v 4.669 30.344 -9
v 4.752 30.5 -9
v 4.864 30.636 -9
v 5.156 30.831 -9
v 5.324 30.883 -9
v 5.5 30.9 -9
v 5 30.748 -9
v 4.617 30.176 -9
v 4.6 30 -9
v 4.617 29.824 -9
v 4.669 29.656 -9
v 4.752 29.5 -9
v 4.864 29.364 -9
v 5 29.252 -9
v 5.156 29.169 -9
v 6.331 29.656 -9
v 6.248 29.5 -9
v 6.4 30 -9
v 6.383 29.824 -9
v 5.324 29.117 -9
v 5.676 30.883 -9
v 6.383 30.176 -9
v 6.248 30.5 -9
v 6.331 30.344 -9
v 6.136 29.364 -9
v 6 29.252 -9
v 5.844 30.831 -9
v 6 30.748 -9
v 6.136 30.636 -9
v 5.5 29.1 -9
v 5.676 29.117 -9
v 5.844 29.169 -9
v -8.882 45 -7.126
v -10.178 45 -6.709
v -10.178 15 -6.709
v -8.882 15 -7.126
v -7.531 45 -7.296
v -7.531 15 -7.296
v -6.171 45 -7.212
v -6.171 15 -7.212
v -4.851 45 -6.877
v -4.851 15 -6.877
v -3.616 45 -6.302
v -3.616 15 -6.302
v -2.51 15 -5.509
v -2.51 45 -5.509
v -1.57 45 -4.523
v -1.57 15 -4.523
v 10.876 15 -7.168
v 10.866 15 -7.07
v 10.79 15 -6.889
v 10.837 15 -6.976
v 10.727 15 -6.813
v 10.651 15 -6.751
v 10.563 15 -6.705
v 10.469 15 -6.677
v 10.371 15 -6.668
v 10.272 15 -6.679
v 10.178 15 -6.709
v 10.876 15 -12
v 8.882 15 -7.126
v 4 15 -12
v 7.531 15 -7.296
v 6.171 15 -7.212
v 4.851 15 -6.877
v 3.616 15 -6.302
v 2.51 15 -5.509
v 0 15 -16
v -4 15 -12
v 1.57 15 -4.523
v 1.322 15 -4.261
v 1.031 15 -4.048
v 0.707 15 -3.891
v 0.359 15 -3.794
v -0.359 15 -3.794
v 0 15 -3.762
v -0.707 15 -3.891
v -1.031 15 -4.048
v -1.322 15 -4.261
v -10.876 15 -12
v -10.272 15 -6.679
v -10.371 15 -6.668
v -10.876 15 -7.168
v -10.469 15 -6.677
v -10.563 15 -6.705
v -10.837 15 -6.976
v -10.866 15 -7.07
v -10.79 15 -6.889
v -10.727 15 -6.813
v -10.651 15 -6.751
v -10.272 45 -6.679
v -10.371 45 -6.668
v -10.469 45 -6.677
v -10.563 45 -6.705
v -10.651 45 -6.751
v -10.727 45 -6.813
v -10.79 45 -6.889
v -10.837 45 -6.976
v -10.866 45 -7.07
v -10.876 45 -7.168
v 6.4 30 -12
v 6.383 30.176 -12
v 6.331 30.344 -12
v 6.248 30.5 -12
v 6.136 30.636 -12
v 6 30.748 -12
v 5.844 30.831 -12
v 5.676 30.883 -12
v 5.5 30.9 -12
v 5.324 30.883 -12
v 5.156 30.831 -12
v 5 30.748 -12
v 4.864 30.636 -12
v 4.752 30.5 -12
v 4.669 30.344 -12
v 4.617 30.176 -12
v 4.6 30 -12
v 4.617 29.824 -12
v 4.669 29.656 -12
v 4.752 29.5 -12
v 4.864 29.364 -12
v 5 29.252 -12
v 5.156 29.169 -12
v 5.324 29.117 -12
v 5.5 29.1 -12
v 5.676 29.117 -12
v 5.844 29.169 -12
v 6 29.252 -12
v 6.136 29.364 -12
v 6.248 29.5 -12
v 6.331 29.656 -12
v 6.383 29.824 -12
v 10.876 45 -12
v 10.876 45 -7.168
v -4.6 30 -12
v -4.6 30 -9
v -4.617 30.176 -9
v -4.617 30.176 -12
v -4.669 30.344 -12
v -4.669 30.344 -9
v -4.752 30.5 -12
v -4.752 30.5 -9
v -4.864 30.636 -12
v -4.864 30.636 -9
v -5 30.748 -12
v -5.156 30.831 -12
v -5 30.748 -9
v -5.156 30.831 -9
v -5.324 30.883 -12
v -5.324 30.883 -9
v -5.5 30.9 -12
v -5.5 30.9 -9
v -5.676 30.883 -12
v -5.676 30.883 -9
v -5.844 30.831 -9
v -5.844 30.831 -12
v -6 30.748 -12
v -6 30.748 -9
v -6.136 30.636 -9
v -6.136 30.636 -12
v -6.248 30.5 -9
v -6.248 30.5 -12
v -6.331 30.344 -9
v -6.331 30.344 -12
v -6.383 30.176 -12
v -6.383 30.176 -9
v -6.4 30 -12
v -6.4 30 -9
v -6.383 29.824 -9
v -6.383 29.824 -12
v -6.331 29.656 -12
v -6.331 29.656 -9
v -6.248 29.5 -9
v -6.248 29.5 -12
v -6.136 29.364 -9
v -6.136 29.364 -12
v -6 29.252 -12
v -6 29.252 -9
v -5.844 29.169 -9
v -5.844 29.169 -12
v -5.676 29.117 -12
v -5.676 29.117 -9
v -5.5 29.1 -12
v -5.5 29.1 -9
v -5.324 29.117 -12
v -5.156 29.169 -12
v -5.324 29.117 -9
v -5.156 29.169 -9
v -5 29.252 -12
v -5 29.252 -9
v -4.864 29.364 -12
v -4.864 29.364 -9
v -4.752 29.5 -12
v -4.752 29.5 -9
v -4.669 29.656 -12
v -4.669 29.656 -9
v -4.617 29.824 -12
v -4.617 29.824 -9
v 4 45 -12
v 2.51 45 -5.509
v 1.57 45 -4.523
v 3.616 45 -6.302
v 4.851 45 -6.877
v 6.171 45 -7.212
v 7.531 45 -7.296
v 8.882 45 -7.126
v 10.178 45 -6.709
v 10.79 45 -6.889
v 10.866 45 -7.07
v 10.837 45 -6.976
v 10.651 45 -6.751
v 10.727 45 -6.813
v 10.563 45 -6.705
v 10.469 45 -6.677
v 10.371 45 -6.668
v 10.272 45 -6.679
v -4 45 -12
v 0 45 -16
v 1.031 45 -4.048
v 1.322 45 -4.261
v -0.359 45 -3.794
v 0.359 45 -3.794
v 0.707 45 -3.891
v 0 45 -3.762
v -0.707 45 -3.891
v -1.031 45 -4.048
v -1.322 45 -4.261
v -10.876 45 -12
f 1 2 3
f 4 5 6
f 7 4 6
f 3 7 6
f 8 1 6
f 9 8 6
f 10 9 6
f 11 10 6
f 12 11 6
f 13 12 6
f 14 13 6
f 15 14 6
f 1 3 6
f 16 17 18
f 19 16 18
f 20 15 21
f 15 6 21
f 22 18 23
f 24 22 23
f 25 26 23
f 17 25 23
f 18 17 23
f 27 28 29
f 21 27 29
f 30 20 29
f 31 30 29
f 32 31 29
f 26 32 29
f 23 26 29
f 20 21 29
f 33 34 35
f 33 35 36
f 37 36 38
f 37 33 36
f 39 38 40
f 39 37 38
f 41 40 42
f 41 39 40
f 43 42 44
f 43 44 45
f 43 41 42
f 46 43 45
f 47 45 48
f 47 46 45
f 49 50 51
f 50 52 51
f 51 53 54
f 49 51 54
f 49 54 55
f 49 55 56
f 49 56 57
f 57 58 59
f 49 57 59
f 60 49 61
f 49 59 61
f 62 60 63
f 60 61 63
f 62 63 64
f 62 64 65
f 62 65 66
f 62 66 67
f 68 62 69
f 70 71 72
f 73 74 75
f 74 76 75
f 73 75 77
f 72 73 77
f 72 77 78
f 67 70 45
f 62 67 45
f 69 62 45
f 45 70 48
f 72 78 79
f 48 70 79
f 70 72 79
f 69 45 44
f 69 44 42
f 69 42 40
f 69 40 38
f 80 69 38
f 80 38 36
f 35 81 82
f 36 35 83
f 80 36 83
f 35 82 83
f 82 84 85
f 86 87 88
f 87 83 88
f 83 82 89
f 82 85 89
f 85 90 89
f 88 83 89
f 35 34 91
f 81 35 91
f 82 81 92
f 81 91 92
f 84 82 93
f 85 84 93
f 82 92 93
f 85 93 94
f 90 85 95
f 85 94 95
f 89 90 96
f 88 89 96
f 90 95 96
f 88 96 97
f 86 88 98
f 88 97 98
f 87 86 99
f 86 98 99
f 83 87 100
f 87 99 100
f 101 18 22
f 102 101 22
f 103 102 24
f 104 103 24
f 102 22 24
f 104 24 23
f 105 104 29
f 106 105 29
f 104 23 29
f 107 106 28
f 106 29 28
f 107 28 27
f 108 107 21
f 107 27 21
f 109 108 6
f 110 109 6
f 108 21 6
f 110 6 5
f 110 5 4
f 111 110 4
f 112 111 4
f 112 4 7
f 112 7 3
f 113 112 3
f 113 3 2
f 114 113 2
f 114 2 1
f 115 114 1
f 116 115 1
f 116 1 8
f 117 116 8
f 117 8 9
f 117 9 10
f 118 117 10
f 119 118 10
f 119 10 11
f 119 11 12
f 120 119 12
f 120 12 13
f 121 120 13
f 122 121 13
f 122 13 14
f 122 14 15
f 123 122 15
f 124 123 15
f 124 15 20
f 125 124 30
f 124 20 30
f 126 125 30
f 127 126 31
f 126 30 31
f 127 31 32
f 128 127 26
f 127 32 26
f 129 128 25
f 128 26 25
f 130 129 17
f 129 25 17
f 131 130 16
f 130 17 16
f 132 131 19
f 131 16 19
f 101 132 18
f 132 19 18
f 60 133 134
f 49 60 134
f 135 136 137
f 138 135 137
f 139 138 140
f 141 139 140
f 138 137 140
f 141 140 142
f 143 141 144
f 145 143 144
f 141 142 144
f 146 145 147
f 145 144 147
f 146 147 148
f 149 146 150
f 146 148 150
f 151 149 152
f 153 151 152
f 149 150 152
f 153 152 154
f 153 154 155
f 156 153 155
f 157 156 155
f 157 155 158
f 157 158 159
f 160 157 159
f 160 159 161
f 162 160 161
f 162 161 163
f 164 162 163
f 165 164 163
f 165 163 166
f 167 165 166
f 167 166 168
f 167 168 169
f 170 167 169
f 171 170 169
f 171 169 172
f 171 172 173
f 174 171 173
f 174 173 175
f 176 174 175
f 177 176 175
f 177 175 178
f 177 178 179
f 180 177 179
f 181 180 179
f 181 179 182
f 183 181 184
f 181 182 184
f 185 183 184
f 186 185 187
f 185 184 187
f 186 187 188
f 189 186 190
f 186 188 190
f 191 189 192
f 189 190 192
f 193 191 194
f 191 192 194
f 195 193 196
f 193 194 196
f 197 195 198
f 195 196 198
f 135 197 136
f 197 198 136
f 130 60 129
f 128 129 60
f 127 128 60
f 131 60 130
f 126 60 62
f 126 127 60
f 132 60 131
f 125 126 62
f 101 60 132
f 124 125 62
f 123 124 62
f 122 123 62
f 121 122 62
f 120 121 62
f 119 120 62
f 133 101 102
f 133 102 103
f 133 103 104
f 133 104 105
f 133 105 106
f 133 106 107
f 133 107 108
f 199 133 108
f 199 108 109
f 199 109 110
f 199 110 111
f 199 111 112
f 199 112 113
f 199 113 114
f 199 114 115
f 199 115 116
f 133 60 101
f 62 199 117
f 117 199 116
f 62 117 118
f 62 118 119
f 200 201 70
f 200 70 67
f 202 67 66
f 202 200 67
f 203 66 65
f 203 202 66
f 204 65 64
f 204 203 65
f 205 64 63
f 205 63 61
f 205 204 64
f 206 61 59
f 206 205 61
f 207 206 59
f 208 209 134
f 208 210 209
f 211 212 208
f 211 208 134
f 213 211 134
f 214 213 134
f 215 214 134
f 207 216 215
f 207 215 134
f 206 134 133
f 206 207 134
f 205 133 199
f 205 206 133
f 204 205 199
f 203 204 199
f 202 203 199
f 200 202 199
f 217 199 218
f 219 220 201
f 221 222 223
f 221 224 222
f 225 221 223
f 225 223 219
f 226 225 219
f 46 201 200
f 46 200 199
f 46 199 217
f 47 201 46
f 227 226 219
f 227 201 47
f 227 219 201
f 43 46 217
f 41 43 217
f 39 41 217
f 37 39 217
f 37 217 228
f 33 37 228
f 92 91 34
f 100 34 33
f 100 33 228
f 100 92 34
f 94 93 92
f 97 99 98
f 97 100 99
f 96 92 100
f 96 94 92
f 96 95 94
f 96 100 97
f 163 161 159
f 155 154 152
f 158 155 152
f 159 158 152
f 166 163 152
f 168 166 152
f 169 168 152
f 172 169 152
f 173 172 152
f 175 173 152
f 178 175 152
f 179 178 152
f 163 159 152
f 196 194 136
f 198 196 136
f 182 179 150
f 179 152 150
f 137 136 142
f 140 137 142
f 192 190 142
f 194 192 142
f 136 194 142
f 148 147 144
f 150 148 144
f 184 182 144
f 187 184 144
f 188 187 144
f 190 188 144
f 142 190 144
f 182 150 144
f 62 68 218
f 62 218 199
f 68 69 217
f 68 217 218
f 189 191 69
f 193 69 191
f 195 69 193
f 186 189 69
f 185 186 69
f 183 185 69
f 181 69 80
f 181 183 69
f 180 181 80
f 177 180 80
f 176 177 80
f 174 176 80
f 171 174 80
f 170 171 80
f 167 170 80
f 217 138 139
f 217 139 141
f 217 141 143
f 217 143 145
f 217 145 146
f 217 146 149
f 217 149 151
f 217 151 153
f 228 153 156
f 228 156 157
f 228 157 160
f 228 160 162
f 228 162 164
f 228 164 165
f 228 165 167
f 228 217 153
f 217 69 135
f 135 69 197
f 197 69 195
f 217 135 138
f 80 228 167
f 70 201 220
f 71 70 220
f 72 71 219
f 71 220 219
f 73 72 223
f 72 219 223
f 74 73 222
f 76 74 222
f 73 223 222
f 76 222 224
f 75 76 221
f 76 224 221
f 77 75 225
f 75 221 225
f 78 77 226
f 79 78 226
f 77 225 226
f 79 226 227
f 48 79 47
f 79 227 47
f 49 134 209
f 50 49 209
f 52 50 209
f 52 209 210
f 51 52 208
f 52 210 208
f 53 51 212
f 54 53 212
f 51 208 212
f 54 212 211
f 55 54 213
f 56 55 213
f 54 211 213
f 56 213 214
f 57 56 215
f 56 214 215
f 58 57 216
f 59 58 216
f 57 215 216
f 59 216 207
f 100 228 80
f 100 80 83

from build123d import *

# Parameters (mm, degrees)
PAD005_DEPTH    = 30
PAD006_DEPTH    = 30
SKETCH043_R     = 0.9
POCKET016_DEPTH = 5


with BuildPart() as part:
    # Sketch037 → Pad005 (new body)
    with BuildSketch(Plane.XZ.offset(-45)):
        with BuildLine():
            ThreePointArc((-10.178404, -6.708561), (-5.503497, -7.075491), (-1.569892, -4.522816))
            ThreePointArc((1.569892, -4.522816), (0, -3.761944), (-1.569892, -4.522816))
            ThreePointArc((1.569892, -4.522816), (5.503497, -7.075491), (10.178405, -6.708561))
            ThreePointArc((10.875556, -7.168051), (10.650715, -6.750573), (10.178405, -6.708561))
            Line((10.875556, -12), (10.875556, -7.168051))
            Line((10.875556, -12), (-10.875555, -12))
            Line((-10.875555, -12), (-10.875555, -7.168051))
            ThreePointArc((-10.178404, -6.708561), (-10.650714, -6.750574), (-10.875555, -7.168051))
        make_face()
    extrude(amount=PAD005_DEPTH)

    # Sketch042 → Pad006 (join)
    with BuildSketch(Plane.XZ.offset(-45)):
        Polygon((-4, -12), (0, -16), (4, -12), align=None)
    extrude(amount=PAD006_DEPTH)

    # Sketch043 → Pocket016 (cut)
    with BuildSketch(Plane.XY.offset(-9)):
        with Locations((-5.5, 30)):
            Circle(SKETCH043_R)
        with Locations((-5.5, -30)):
            Circle(SKETCH043_R)
        with Locations((5.5, 30)):
            Circle(SKETCH043_R)
        with Locations((5.5, -30)):
            Circle(SKETCH043_R)
    extrude(amount=-POCKET016_DEPTH, mode=Mode.SUBTRACT)


solid = part.part
